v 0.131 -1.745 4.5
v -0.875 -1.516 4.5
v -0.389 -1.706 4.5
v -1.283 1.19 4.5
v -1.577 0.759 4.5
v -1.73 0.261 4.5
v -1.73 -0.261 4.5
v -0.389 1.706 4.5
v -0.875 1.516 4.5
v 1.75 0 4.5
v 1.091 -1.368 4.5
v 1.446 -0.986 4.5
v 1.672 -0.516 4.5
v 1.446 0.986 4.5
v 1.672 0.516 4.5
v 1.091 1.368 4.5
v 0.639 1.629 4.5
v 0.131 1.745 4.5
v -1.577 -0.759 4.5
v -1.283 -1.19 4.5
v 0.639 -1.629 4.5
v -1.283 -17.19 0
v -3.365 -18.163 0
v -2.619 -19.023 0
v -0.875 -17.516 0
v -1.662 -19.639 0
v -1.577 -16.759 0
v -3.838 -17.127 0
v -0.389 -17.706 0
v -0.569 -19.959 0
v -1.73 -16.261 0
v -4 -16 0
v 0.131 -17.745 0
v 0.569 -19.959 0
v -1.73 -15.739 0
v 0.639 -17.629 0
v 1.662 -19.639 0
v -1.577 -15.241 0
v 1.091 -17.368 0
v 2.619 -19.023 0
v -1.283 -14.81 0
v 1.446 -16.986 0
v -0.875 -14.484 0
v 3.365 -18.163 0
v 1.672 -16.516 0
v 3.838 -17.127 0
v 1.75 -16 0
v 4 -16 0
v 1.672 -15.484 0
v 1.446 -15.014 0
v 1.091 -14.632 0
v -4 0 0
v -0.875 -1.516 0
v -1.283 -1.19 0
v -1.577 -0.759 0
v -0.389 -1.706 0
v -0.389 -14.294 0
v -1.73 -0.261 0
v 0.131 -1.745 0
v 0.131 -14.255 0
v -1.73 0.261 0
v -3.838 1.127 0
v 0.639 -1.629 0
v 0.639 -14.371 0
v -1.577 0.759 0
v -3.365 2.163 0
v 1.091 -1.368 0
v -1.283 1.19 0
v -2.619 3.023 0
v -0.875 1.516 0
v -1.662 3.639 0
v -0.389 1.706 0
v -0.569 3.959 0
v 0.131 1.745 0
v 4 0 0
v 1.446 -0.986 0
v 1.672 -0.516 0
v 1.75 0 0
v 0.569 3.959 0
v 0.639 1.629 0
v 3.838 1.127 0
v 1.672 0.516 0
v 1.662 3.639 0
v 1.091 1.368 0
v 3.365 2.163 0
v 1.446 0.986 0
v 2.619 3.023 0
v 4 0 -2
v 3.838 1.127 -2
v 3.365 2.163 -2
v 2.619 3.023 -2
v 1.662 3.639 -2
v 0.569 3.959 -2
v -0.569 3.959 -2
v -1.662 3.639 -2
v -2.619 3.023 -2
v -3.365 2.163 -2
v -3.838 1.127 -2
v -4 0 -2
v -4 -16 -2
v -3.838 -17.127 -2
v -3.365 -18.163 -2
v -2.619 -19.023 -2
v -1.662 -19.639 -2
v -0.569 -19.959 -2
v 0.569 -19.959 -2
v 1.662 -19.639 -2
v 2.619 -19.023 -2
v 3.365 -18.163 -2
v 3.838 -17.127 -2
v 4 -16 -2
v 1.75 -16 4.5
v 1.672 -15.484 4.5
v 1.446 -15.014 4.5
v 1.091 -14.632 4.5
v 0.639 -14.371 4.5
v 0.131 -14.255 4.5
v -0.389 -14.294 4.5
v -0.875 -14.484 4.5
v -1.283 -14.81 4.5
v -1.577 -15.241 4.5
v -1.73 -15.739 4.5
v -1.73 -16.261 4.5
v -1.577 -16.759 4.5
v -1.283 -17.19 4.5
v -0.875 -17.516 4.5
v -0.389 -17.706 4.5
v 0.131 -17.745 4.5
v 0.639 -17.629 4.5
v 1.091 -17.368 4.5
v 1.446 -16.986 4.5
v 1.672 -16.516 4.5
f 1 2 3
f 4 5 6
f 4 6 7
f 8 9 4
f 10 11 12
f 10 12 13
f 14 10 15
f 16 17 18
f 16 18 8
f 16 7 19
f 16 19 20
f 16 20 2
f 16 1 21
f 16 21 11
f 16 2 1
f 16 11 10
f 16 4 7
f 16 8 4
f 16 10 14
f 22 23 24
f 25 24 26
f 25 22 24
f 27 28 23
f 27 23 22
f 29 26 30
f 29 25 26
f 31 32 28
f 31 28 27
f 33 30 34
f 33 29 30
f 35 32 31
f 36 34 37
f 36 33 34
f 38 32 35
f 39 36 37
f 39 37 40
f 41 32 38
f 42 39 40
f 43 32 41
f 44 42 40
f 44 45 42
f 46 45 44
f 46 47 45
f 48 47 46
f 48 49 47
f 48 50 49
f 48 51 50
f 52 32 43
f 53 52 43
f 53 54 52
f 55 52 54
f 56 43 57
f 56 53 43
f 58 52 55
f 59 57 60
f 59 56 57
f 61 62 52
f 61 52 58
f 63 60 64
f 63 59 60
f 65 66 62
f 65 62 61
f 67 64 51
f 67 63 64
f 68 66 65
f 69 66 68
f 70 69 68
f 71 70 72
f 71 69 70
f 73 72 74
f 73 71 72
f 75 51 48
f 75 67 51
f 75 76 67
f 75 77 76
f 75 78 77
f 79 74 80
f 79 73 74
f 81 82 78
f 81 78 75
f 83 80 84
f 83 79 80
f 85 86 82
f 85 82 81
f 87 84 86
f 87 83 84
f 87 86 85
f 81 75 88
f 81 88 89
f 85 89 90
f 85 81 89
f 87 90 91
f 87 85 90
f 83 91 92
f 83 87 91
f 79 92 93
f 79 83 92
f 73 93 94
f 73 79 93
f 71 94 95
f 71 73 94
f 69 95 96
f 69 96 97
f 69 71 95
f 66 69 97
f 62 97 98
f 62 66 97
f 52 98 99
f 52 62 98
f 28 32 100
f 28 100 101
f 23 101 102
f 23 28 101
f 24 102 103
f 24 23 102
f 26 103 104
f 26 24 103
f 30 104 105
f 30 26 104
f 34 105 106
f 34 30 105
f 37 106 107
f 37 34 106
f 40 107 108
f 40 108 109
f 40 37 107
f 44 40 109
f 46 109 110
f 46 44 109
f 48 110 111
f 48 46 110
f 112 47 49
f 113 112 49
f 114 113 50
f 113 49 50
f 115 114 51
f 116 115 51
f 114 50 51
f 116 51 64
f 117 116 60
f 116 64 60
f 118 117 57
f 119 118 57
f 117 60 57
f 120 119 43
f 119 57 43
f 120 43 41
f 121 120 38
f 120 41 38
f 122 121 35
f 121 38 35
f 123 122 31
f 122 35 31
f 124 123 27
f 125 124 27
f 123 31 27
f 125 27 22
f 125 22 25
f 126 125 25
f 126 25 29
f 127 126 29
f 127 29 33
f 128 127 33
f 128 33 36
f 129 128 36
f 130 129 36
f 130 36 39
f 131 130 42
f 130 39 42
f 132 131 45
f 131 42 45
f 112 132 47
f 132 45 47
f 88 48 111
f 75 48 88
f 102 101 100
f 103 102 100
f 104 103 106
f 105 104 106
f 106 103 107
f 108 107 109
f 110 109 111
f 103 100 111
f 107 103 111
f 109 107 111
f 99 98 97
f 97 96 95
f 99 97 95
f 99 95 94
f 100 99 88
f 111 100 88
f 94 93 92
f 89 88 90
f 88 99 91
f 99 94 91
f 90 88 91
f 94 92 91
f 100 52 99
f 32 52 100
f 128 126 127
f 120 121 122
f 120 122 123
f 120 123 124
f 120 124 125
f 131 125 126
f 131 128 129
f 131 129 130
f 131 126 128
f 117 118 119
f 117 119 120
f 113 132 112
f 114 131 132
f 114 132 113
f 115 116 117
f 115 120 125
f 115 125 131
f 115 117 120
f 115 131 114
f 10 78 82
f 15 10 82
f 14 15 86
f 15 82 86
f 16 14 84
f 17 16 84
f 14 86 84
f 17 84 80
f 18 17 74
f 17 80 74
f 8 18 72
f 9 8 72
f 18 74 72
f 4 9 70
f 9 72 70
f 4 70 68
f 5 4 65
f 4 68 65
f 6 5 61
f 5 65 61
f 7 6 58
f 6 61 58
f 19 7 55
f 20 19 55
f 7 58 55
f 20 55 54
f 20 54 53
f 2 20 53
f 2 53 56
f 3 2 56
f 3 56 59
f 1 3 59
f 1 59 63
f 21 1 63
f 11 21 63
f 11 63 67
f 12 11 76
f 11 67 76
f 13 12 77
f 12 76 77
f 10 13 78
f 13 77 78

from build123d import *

# Parameters (mm, degrees)
BOSS_EXTRUDE1_DEPTH = 2
SKETCH1_4_R         = 1.75
BOSS_EXTRUDE2_DEPTH = 4.5


with BuildPart() as part:
    # Sketch1 → Boss-Extrude1 (new body)
    with BuildSketch(Plane.XY):
        with BuildLine():
            ThreePointArc((4, 0), (0, 4), (-4, 0))
            Line((-4, 0), (-4, -16))
            ThreePointArc((-4, -16), (0, -20), (4, -16))
            Line((4, -16), (4, 0))
        make_face()
    extrude(amount=-BOSS_EXTRUDE1_DEPTH)

    # Sketch1<4> → Boss-Extrude2 (add)
    with BuildSketch(Plane.XY):
        Circle(SKETCH1_4_R)
        with Locations((0, -16)):
            Circle(SKETCH1_4_R)
    extrude(amount=BOSS_EXTRUDE2_DEPTH)


solid = part.part
